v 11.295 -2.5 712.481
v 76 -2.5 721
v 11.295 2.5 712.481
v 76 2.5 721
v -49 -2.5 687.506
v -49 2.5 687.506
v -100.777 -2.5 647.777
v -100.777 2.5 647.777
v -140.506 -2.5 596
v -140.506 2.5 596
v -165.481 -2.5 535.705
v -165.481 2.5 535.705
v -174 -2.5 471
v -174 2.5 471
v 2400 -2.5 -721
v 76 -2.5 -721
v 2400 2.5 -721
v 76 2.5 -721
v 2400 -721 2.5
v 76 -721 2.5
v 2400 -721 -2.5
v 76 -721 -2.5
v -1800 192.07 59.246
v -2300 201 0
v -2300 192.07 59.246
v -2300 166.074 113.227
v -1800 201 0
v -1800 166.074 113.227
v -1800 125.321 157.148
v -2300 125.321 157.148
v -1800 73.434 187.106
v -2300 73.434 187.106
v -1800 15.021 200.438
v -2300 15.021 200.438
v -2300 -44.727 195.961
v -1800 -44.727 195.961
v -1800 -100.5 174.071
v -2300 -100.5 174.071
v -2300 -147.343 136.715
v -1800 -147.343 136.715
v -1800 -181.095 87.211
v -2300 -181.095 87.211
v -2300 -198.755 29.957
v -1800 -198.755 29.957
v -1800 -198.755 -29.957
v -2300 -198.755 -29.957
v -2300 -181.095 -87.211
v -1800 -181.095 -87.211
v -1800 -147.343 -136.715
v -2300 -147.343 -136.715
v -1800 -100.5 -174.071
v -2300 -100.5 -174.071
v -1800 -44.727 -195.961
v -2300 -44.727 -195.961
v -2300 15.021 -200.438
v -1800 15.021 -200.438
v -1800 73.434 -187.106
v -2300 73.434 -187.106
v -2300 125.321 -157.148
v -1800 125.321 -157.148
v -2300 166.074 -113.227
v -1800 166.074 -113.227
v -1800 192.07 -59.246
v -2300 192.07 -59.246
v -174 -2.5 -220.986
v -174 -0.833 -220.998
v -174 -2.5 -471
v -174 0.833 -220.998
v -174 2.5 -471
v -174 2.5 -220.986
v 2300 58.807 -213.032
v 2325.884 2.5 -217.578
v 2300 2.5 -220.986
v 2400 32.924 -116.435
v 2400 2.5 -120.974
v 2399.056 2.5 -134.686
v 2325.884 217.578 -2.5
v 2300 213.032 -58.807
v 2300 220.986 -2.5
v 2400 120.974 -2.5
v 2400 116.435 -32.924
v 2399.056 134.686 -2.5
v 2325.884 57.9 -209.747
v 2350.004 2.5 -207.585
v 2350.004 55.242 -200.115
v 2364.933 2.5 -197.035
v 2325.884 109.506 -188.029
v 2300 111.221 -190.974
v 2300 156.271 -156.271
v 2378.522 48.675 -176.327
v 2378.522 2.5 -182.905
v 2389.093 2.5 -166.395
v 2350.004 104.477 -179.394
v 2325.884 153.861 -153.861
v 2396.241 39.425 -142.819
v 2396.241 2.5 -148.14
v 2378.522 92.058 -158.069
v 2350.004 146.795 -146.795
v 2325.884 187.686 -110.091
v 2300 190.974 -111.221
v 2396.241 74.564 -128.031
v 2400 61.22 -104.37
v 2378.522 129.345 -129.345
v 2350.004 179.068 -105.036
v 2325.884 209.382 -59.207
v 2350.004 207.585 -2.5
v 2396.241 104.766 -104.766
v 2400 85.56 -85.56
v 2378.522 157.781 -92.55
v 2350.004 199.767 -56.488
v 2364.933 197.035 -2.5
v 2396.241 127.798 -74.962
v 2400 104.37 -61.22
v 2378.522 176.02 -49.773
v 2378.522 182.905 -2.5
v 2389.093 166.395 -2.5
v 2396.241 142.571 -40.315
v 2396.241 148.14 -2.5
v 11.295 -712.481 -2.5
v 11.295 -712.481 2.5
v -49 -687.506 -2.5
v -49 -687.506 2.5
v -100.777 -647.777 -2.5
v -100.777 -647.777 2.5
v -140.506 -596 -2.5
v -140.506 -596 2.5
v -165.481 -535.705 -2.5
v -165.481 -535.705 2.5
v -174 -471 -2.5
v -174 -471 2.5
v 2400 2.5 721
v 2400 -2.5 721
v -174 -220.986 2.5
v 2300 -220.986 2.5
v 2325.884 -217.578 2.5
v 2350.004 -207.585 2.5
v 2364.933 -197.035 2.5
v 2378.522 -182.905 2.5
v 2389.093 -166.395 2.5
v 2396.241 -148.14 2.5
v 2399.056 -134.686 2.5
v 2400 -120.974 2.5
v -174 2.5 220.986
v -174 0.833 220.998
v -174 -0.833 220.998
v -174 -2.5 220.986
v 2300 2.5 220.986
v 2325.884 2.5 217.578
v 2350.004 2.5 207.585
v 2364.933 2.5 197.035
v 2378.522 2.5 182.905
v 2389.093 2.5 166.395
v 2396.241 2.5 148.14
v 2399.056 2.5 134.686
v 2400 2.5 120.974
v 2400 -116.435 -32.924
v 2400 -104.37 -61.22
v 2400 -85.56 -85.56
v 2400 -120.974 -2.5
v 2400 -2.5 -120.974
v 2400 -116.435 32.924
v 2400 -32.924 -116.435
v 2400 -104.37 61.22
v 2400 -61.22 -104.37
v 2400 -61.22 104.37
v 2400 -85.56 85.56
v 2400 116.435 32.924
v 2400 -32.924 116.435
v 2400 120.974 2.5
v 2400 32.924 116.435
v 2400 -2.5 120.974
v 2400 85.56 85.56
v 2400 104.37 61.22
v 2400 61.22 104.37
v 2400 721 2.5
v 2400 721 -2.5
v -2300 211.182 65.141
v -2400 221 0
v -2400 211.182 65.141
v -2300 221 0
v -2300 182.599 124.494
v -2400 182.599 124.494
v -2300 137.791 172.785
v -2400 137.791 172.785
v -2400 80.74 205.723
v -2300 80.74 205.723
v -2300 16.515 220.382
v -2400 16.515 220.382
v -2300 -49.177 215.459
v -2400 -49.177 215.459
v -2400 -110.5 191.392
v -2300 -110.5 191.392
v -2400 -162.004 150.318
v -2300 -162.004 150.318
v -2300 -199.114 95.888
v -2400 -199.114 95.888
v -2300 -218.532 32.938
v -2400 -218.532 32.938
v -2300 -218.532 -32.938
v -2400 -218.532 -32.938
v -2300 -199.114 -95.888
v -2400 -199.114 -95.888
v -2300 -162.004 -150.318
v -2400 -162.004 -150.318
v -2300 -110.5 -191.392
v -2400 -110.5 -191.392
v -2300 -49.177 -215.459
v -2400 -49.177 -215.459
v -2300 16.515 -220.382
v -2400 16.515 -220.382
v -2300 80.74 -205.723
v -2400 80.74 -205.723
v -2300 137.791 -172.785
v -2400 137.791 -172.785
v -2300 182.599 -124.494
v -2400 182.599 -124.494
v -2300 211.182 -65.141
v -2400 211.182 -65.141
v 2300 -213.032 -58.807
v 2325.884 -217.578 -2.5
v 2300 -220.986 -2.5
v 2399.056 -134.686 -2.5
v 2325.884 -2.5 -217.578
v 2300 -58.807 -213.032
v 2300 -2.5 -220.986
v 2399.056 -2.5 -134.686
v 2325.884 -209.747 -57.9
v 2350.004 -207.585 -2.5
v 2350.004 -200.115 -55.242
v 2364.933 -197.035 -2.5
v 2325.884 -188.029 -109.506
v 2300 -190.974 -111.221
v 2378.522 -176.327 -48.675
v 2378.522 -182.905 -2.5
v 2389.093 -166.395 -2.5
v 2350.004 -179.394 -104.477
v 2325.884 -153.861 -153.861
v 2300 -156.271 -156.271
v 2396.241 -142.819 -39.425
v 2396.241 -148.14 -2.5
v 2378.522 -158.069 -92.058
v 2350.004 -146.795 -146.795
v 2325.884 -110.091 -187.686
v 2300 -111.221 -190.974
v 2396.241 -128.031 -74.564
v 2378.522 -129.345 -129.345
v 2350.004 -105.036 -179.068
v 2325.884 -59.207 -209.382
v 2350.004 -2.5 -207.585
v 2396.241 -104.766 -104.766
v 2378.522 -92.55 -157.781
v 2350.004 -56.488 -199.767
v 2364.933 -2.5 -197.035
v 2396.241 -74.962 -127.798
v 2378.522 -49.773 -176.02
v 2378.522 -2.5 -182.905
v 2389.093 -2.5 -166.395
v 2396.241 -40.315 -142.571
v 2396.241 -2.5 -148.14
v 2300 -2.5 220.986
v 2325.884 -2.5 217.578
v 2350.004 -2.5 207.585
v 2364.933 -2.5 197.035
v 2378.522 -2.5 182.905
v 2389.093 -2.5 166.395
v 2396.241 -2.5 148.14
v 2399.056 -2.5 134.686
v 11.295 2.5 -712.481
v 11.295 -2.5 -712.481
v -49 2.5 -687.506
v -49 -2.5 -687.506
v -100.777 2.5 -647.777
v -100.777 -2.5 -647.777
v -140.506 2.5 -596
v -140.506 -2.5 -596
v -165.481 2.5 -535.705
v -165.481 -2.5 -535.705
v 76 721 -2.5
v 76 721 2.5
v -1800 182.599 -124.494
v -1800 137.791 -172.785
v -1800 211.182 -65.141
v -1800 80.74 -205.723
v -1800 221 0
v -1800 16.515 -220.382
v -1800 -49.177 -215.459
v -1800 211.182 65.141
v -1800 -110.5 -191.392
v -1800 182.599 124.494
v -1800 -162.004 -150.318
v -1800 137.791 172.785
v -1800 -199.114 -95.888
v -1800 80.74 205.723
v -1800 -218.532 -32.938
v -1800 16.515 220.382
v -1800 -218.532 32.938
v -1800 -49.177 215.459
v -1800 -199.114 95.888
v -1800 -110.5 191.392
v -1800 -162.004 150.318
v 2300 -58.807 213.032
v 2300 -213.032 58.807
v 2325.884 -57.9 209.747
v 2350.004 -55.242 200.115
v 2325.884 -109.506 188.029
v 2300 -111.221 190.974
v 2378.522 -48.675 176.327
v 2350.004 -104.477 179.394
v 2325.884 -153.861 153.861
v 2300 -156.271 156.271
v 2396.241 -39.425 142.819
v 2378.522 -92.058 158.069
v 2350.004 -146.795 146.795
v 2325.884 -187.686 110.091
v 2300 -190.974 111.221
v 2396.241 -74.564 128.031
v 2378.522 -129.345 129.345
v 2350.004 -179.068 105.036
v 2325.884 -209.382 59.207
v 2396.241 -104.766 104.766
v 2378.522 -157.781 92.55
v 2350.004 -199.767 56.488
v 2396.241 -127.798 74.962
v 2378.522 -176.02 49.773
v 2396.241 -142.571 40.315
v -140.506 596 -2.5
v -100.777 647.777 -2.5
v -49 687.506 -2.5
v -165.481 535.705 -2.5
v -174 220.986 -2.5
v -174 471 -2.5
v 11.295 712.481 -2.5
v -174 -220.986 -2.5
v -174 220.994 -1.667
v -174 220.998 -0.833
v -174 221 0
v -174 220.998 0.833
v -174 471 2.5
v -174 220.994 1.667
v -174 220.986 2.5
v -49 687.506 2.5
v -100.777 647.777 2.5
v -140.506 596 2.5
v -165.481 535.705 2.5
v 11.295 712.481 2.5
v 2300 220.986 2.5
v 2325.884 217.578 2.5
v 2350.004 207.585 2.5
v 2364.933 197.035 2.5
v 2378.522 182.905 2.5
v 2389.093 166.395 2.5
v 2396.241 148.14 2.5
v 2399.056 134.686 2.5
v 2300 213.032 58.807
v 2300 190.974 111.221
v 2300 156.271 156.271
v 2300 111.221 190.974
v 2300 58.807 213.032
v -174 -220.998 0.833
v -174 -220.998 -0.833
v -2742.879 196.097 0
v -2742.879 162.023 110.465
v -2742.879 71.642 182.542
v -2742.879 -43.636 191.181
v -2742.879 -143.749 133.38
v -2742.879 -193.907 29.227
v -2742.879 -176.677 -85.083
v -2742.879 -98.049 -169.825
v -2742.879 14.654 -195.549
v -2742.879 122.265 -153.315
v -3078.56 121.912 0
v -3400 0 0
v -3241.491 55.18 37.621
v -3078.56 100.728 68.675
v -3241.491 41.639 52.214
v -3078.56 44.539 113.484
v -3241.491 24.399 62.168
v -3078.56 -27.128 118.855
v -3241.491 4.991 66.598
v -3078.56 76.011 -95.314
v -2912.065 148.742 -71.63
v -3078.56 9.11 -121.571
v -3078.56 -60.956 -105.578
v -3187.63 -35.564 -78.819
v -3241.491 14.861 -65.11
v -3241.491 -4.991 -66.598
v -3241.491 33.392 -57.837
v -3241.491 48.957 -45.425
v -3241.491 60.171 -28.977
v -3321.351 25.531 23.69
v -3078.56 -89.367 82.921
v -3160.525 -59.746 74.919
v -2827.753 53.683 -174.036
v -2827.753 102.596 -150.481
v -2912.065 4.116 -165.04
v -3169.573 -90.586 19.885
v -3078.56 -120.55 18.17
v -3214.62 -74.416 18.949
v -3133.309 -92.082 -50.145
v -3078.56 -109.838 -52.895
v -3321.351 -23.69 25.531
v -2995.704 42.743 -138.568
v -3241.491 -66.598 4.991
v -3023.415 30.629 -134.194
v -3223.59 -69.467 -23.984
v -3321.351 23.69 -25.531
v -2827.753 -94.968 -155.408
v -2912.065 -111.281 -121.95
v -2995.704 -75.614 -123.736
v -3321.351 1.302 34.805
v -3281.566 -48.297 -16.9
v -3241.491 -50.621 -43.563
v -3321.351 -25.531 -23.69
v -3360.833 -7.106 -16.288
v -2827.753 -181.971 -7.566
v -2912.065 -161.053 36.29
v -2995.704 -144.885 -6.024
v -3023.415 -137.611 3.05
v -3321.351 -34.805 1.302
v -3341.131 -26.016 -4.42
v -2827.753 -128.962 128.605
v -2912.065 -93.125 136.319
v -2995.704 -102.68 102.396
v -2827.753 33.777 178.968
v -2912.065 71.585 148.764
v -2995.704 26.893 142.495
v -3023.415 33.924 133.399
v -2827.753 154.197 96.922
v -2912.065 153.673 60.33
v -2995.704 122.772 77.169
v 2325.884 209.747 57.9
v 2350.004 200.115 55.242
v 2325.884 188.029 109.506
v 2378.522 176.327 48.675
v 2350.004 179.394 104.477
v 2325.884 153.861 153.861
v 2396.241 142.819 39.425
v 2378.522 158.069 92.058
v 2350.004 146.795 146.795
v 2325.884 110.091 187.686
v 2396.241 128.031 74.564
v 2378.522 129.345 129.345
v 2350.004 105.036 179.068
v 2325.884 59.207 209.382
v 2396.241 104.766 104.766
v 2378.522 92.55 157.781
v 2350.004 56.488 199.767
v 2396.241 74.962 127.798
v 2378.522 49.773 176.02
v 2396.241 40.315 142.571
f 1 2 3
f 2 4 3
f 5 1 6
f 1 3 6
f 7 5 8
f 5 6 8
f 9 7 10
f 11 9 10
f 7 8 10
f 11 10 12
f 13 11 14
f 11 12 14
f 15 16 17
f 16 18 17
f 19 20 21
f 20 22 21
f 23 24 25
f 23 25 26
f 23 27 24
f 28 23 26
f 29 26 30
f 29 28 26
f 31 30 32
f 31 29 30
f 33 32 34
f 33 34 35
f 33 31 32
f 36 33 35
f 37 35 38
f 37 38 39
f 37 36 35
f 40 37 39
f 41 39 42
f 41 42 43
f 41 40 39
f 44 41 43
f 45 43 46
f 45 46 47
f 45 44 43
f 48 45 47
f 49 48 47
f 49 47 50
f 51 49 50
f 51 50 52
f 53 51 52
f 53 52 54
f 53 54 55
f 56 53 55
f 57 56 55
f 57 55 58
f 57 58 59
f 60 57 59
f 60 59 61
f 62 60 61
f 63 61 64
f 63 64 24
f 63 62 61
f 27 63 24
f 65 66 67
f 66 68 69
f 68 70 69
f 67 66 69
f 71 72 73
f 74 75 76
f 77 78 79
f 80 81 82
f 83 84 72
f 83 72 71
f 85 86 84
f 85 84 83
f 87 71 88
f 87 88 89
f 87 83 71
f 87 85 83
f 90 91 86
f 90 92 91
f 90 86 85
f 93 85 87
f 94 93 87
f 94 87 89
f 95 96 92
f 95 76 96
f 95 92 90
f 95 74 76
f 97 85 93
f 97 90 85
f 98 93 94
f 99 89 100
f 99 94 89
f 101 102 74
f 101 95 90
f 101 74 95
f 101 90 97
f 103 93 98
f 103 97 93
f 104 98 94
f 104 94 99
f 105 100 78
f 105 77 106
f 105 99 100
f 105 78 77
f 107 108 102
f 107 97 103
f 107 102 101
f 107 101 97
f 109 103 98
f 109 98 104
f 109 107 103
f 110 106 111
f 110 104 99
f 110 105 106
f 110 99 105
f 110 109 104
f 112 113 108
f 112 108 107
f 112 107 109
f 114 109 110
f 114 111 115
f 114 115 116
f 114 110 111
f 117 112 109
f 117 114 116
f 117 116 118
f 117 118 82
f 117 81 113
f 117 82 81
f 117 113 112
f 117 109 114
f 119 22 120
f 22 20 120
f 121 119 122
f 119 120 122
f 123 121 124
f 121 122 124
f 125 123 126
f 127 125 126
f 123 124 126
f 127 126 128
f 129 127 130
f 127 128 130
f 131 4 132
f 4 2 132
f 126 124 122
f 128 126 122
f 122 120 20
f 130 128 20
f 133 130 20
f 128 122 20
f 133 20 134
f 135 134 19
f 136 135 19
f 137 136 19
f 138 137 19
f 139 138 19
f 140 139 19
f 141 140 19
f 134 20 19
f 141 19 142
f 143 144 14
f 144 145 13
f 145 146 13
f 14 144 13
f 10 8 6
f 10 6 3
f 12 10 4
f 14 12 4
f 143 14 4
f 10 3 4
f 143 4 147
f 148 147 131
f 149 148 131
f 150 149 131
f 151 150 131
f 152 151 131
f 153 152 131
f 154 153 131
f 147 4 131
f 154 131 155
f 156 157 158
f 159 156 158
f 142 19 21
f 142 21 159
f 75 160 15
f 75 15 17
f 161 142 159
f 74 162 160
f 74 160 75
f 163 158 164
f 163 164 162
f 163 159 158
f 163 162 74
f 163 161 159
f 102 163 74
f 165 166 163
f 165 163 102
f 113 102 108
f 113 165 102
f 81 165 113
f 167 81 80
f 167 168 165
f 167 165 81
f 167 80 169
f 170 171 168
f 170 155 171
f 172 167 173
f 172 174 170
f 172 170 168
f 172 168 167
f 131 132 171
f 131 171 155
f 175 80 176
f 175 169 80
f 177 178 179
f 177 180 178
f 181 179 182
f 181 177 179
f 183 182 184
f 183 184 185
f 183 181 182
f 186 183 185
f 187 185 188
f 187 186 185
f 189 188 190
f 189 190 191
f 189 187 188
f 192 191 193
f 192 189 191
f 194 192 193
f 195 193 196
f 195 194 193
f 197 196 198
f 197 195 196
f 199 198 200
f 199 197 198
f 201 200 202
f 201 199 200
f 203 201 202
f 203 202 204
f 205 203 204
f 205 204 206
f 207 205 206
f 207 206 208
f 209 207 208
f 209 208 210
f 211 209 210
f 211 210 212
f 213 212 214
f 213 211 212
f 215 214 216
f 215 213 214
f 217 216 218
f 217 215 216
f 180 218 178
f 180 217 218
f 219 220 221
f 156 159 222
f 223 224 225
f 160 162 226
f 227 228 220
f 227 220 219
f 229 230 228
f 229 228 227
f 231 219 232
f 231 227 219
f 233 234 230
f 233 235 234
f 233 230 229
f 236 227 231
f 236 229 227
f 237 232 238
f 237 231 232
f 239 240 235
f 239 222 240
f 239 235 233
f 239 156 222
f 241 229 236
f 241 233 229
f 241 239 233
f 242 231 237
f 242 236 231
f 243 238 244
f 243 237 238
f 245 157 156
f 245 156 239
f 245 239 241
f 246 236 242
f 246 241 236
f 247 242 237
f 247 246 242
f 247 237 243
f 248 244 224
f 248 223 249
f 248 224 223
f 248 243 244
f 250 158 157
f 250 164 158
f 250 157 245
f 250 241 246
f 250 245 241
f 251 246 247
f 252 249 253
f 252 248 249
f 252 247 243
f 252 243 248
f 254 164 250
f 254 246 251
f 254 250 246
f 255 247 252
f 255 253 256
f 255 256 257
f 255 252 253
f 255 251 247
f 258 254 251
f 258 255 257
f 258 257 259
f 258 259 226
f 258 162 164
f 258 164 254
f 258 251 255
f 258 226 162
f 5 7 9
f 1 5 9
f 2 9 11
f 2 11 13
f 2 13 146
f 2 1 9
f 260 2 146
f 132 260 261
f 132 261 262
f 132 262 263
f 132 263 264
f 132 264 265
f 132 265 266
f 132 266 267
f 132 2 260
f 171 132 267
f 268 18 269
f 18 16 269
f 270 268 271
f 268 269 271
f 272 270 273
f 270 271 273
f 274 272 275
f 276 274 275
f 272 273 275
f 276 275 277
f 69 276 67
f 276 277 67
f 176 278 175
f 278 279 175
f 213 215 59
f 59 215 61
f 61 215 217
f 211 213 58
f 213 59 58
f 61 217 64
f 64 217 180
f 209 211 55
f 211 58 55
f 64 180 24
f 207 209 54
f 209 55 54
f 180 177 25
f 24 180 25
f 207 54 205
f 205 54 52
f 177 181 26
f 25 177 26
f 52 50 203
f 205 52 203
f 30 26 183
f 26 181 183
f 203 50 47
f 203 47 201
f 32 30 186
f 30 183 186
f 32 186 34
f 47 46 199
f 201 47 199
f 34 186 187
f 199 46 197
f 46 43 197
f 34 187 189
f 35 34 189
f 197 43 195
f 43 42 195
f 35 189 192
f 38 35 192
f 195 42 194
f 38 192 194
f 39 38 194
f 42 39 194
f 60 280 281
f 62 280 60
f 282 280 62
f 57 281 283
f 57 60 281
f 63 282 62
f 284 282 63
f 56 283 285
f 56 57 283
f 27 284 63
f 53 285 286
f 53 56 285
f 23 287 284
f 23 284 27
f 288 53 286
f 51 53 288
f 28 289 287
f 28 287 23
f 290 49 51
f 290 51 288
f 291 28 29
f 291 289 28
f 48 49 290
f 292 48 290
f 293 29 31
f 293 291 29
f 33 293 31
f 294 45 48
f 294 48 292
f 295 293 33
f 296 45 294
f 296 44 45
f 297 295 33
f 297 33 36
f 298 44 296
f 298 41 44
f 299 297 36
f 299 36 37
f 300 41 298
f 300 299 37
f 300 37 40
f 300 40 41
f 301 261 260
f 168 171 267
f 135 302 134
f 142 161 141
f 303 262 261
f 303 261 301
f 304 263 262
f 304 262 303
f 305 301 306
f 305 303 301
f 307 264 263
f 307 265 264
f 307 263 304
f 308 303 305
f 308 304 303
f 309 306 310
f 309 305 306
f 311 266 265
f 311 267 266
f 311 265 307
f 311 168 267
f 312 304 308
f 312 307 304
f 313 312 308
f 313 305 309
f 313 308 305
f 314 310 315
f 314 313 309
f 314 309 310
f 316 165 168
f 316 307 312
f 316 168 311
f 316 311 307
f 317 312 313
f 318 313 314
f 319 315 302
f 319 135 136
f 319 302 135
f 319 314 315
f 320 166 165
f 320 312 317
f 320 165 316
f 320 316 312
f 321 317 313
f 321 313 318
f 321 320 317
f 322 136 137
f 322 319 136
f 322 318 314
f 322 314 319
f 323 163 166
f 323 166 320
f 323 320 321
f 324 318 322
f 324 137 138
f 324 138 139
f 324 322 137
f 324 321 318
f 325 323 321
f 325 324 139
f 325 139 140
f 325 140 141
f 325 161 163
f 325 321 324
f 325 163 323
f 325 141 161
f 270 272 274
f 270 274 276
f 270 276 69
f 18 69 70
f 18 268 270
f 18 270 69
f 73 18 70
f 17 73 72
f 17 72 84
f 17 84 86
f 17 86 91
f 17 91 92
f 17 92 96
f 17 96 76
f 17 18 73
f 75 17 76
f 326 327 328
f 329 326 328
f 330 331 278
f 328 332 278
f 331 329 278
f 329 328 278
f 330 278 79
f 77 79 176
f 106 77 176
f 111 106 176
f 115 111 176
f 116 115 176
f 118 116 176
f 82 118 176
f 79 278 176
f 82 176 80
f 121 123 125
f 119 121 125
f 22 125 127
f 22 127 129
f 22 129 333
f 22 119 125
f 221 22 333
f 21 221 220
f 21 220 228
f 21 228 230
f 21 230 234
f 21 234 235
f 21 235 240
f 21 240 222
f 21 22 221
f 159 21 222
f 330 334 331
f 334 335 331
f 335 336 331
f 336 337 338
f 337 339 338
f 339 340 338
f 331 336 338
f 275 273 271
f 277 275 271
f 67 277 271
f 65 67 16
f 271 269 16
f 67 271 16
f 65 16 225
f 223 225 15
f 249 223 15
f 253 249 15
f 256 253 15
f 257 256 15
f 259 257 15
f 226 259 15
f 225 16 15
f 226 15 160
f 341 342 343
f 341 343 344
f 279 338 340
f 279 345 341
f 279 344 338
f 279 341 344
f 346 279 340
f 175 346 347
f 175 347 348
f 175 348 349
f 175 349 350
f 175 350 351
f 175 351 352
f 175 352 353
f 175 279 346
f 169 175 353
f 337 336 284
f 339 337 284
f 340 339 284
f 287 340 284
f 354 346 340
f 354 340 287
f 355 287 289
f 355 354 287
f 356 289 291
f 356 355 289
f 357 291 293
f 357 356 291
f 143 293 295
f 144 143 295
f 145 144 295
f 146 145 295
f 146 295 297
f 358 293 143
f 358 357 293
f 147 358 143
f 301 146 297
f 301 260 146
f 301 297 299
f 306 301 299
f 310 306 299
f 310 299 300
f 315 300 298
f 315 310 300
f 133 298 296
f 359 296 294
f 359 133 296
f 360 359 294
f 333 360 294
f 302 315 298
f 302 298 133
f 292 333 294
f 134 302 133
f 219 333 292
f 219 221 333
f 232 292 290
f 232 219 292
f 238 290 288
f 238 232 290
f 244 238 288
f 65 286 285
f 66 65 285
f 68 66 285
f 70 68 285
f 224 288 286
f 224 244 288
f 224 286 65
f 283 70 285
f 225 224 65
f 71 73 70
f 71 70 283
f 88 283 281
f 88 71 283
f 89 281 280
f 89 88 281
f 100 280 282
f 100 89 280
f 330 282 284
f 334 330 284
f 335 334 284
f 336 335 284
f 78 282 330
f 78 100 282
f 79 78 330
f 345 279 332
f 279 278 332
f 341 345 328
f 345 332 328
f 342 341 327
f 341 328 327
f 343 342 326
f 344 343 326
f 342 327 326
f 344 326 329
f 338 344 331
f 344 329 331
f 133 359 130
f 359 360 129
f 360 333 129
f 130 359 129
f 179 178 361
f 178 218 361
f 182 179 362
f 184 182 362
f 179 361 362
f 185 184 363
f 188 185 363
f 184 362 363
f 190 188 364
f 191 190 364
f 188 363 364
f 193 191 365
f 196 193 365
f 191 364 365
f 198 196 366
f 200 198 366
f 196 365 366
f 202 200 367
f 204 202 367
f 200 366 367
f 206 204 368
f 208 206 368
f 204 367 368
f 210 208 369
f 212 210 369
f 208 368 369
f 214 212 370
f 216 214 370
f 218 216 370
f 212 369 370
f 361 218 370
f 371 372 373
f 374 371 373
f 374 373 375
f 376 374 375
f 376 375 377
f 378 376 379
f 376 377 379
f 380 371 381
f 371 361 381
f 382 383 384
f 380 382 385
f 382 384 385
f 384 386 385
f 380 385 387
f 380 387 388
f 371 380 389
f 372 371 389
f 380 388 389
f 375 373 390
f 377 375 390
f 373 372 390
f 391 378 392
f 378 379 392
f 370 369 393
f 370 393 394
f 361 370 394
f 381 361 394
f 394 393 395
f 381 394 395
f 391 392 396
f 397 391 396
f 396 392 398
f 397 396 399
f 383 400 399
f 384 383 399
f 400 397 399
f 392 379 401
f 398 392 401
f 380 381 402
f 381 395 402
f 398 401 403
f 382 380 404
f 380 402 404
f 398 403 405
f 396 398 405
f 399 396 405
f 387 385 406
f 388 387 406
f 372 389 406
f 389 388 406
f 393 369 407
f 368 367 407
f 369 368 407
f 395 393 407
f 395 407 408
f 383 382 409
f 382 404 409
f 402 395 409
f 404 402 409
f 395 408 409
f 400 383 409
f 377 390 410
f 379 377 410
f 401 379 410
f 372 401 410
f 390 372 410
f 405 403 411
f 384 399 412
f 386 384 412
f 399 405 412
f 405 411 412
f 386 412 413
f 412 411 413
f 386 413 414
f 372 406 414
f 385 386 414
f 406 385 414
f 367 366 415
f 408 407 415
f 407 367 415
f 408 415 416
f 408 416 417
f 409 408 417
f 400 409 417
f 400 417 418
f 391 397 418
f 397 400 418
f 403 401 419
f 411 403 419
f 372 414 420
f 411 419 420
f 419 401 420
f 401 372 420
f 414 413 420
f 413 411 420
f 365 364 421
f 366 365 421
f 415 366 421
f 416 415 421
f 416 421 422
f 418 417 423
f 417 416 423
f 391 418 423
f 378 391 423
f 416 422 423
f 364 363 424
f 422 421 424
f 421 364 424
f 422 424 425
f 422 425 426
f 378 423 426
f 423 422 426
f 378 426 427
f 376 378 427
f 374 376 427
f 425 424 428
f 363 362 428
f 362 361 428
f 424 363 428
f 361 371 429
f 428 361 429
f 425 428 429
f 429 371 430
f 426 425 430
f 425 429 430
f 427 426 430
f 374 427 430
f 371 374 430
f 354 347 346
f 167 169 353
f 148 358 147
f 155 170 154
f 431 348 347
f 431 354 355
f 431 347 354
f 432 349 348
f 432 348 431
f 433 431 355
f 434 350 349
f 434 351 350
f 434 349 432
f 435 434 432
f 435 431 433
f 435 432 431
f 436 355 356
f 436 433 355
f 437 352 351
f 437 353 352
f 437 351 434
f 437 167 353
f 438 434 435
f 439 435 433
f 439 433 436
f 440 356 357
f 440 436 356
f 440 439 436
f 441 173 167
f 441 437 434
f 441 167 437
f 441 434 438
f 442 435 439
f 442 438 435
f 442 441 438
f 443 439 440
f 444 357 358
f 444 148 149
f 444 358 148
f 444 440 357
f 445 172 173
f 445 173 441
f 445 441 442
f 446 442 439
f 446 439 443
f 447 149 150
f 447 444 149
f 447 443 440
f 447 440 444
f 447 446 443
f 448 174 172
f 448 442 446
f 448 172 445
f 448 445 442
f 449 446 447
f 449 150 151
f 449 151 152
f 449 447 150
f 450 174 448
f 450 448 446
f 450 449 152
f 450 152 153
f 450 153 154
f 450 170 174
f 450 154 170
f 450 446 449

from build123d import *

# Parameters (mm, degrees)
FILLET_R           = 100
SKETCH001_W        = 2574
SKETCH001_H        = 721
PAD_DEPTH          = 2.5
POLARPATTERN_COUNT = 4
FILLET001_R        = 250
SKETCH002_W        = 500
SKETCH002_H        = 20


with BuildPart() as part:
    # Sketch → Revolution (revolve)
    with BuildSketch(Plane.XY):
        with BuildLine():
            Line((-2400, 221), (2400, 221))
            Line((2400, 221), (2400, 0))
            Line((2400, 0), (-2400, 0))
            Line((-3400, 0), (-2400, 0))
            ThreePointArc((-2400, 221), (-2912.064693, 165.091372), (-3400, 0))
        make_face()
    revolve(axis=Axis((0, 0, 0), (1, 0, 0)))

    # Fillet
    fillet_edges = [part.edges().sort_by_distance(p)[0] for p in [
        (2400, -221, 0),
    ]]
    fillet(fillet_edges, radius=FILLET_R)

    # Sketch001 → Pad (new body, symmetric)
    with BuildSketch(Plane.XY):
        with Locations((1113, 360.5)):
            Rectangle(SKETCH001_W, SKETCH001_H)
    pad = extrude(amount=PAD_DEPTH, both=True)

    # PolarPattern: Pad ×4 about axis
    polarpattern_axis = Axis((0, 0, 0), (1, 0, 0))
    for i in range(1, POLARPATTERN_COUNT):
        add(pad.rotate(polarpattern_axis, i * 360 / POLARPATTERN_COUNT))

    # Fillet001
    fillet001_edges = [part.edges().sort_by_distance(p)[0] for p in [
        (-174, 0, 721),
        (-174, 721, 0),
        (-174, -721, 0),
        (-174, 0, -721),
    ]]
    fillet(fillet001_edges, radius=FILLET001_R)

    # Sketch002 → Groove (revolve, cut)
    with BuildSketch(Plane.XY):
        with Locations((-2050, 211)):
            Rectangle(SKETCH002_W, SKETCH002_H)
    revolve(axis=Axis((0, 0, 0), (1, 0, 0)), mode=Mode.SUBTRACT)


solid = part.part
